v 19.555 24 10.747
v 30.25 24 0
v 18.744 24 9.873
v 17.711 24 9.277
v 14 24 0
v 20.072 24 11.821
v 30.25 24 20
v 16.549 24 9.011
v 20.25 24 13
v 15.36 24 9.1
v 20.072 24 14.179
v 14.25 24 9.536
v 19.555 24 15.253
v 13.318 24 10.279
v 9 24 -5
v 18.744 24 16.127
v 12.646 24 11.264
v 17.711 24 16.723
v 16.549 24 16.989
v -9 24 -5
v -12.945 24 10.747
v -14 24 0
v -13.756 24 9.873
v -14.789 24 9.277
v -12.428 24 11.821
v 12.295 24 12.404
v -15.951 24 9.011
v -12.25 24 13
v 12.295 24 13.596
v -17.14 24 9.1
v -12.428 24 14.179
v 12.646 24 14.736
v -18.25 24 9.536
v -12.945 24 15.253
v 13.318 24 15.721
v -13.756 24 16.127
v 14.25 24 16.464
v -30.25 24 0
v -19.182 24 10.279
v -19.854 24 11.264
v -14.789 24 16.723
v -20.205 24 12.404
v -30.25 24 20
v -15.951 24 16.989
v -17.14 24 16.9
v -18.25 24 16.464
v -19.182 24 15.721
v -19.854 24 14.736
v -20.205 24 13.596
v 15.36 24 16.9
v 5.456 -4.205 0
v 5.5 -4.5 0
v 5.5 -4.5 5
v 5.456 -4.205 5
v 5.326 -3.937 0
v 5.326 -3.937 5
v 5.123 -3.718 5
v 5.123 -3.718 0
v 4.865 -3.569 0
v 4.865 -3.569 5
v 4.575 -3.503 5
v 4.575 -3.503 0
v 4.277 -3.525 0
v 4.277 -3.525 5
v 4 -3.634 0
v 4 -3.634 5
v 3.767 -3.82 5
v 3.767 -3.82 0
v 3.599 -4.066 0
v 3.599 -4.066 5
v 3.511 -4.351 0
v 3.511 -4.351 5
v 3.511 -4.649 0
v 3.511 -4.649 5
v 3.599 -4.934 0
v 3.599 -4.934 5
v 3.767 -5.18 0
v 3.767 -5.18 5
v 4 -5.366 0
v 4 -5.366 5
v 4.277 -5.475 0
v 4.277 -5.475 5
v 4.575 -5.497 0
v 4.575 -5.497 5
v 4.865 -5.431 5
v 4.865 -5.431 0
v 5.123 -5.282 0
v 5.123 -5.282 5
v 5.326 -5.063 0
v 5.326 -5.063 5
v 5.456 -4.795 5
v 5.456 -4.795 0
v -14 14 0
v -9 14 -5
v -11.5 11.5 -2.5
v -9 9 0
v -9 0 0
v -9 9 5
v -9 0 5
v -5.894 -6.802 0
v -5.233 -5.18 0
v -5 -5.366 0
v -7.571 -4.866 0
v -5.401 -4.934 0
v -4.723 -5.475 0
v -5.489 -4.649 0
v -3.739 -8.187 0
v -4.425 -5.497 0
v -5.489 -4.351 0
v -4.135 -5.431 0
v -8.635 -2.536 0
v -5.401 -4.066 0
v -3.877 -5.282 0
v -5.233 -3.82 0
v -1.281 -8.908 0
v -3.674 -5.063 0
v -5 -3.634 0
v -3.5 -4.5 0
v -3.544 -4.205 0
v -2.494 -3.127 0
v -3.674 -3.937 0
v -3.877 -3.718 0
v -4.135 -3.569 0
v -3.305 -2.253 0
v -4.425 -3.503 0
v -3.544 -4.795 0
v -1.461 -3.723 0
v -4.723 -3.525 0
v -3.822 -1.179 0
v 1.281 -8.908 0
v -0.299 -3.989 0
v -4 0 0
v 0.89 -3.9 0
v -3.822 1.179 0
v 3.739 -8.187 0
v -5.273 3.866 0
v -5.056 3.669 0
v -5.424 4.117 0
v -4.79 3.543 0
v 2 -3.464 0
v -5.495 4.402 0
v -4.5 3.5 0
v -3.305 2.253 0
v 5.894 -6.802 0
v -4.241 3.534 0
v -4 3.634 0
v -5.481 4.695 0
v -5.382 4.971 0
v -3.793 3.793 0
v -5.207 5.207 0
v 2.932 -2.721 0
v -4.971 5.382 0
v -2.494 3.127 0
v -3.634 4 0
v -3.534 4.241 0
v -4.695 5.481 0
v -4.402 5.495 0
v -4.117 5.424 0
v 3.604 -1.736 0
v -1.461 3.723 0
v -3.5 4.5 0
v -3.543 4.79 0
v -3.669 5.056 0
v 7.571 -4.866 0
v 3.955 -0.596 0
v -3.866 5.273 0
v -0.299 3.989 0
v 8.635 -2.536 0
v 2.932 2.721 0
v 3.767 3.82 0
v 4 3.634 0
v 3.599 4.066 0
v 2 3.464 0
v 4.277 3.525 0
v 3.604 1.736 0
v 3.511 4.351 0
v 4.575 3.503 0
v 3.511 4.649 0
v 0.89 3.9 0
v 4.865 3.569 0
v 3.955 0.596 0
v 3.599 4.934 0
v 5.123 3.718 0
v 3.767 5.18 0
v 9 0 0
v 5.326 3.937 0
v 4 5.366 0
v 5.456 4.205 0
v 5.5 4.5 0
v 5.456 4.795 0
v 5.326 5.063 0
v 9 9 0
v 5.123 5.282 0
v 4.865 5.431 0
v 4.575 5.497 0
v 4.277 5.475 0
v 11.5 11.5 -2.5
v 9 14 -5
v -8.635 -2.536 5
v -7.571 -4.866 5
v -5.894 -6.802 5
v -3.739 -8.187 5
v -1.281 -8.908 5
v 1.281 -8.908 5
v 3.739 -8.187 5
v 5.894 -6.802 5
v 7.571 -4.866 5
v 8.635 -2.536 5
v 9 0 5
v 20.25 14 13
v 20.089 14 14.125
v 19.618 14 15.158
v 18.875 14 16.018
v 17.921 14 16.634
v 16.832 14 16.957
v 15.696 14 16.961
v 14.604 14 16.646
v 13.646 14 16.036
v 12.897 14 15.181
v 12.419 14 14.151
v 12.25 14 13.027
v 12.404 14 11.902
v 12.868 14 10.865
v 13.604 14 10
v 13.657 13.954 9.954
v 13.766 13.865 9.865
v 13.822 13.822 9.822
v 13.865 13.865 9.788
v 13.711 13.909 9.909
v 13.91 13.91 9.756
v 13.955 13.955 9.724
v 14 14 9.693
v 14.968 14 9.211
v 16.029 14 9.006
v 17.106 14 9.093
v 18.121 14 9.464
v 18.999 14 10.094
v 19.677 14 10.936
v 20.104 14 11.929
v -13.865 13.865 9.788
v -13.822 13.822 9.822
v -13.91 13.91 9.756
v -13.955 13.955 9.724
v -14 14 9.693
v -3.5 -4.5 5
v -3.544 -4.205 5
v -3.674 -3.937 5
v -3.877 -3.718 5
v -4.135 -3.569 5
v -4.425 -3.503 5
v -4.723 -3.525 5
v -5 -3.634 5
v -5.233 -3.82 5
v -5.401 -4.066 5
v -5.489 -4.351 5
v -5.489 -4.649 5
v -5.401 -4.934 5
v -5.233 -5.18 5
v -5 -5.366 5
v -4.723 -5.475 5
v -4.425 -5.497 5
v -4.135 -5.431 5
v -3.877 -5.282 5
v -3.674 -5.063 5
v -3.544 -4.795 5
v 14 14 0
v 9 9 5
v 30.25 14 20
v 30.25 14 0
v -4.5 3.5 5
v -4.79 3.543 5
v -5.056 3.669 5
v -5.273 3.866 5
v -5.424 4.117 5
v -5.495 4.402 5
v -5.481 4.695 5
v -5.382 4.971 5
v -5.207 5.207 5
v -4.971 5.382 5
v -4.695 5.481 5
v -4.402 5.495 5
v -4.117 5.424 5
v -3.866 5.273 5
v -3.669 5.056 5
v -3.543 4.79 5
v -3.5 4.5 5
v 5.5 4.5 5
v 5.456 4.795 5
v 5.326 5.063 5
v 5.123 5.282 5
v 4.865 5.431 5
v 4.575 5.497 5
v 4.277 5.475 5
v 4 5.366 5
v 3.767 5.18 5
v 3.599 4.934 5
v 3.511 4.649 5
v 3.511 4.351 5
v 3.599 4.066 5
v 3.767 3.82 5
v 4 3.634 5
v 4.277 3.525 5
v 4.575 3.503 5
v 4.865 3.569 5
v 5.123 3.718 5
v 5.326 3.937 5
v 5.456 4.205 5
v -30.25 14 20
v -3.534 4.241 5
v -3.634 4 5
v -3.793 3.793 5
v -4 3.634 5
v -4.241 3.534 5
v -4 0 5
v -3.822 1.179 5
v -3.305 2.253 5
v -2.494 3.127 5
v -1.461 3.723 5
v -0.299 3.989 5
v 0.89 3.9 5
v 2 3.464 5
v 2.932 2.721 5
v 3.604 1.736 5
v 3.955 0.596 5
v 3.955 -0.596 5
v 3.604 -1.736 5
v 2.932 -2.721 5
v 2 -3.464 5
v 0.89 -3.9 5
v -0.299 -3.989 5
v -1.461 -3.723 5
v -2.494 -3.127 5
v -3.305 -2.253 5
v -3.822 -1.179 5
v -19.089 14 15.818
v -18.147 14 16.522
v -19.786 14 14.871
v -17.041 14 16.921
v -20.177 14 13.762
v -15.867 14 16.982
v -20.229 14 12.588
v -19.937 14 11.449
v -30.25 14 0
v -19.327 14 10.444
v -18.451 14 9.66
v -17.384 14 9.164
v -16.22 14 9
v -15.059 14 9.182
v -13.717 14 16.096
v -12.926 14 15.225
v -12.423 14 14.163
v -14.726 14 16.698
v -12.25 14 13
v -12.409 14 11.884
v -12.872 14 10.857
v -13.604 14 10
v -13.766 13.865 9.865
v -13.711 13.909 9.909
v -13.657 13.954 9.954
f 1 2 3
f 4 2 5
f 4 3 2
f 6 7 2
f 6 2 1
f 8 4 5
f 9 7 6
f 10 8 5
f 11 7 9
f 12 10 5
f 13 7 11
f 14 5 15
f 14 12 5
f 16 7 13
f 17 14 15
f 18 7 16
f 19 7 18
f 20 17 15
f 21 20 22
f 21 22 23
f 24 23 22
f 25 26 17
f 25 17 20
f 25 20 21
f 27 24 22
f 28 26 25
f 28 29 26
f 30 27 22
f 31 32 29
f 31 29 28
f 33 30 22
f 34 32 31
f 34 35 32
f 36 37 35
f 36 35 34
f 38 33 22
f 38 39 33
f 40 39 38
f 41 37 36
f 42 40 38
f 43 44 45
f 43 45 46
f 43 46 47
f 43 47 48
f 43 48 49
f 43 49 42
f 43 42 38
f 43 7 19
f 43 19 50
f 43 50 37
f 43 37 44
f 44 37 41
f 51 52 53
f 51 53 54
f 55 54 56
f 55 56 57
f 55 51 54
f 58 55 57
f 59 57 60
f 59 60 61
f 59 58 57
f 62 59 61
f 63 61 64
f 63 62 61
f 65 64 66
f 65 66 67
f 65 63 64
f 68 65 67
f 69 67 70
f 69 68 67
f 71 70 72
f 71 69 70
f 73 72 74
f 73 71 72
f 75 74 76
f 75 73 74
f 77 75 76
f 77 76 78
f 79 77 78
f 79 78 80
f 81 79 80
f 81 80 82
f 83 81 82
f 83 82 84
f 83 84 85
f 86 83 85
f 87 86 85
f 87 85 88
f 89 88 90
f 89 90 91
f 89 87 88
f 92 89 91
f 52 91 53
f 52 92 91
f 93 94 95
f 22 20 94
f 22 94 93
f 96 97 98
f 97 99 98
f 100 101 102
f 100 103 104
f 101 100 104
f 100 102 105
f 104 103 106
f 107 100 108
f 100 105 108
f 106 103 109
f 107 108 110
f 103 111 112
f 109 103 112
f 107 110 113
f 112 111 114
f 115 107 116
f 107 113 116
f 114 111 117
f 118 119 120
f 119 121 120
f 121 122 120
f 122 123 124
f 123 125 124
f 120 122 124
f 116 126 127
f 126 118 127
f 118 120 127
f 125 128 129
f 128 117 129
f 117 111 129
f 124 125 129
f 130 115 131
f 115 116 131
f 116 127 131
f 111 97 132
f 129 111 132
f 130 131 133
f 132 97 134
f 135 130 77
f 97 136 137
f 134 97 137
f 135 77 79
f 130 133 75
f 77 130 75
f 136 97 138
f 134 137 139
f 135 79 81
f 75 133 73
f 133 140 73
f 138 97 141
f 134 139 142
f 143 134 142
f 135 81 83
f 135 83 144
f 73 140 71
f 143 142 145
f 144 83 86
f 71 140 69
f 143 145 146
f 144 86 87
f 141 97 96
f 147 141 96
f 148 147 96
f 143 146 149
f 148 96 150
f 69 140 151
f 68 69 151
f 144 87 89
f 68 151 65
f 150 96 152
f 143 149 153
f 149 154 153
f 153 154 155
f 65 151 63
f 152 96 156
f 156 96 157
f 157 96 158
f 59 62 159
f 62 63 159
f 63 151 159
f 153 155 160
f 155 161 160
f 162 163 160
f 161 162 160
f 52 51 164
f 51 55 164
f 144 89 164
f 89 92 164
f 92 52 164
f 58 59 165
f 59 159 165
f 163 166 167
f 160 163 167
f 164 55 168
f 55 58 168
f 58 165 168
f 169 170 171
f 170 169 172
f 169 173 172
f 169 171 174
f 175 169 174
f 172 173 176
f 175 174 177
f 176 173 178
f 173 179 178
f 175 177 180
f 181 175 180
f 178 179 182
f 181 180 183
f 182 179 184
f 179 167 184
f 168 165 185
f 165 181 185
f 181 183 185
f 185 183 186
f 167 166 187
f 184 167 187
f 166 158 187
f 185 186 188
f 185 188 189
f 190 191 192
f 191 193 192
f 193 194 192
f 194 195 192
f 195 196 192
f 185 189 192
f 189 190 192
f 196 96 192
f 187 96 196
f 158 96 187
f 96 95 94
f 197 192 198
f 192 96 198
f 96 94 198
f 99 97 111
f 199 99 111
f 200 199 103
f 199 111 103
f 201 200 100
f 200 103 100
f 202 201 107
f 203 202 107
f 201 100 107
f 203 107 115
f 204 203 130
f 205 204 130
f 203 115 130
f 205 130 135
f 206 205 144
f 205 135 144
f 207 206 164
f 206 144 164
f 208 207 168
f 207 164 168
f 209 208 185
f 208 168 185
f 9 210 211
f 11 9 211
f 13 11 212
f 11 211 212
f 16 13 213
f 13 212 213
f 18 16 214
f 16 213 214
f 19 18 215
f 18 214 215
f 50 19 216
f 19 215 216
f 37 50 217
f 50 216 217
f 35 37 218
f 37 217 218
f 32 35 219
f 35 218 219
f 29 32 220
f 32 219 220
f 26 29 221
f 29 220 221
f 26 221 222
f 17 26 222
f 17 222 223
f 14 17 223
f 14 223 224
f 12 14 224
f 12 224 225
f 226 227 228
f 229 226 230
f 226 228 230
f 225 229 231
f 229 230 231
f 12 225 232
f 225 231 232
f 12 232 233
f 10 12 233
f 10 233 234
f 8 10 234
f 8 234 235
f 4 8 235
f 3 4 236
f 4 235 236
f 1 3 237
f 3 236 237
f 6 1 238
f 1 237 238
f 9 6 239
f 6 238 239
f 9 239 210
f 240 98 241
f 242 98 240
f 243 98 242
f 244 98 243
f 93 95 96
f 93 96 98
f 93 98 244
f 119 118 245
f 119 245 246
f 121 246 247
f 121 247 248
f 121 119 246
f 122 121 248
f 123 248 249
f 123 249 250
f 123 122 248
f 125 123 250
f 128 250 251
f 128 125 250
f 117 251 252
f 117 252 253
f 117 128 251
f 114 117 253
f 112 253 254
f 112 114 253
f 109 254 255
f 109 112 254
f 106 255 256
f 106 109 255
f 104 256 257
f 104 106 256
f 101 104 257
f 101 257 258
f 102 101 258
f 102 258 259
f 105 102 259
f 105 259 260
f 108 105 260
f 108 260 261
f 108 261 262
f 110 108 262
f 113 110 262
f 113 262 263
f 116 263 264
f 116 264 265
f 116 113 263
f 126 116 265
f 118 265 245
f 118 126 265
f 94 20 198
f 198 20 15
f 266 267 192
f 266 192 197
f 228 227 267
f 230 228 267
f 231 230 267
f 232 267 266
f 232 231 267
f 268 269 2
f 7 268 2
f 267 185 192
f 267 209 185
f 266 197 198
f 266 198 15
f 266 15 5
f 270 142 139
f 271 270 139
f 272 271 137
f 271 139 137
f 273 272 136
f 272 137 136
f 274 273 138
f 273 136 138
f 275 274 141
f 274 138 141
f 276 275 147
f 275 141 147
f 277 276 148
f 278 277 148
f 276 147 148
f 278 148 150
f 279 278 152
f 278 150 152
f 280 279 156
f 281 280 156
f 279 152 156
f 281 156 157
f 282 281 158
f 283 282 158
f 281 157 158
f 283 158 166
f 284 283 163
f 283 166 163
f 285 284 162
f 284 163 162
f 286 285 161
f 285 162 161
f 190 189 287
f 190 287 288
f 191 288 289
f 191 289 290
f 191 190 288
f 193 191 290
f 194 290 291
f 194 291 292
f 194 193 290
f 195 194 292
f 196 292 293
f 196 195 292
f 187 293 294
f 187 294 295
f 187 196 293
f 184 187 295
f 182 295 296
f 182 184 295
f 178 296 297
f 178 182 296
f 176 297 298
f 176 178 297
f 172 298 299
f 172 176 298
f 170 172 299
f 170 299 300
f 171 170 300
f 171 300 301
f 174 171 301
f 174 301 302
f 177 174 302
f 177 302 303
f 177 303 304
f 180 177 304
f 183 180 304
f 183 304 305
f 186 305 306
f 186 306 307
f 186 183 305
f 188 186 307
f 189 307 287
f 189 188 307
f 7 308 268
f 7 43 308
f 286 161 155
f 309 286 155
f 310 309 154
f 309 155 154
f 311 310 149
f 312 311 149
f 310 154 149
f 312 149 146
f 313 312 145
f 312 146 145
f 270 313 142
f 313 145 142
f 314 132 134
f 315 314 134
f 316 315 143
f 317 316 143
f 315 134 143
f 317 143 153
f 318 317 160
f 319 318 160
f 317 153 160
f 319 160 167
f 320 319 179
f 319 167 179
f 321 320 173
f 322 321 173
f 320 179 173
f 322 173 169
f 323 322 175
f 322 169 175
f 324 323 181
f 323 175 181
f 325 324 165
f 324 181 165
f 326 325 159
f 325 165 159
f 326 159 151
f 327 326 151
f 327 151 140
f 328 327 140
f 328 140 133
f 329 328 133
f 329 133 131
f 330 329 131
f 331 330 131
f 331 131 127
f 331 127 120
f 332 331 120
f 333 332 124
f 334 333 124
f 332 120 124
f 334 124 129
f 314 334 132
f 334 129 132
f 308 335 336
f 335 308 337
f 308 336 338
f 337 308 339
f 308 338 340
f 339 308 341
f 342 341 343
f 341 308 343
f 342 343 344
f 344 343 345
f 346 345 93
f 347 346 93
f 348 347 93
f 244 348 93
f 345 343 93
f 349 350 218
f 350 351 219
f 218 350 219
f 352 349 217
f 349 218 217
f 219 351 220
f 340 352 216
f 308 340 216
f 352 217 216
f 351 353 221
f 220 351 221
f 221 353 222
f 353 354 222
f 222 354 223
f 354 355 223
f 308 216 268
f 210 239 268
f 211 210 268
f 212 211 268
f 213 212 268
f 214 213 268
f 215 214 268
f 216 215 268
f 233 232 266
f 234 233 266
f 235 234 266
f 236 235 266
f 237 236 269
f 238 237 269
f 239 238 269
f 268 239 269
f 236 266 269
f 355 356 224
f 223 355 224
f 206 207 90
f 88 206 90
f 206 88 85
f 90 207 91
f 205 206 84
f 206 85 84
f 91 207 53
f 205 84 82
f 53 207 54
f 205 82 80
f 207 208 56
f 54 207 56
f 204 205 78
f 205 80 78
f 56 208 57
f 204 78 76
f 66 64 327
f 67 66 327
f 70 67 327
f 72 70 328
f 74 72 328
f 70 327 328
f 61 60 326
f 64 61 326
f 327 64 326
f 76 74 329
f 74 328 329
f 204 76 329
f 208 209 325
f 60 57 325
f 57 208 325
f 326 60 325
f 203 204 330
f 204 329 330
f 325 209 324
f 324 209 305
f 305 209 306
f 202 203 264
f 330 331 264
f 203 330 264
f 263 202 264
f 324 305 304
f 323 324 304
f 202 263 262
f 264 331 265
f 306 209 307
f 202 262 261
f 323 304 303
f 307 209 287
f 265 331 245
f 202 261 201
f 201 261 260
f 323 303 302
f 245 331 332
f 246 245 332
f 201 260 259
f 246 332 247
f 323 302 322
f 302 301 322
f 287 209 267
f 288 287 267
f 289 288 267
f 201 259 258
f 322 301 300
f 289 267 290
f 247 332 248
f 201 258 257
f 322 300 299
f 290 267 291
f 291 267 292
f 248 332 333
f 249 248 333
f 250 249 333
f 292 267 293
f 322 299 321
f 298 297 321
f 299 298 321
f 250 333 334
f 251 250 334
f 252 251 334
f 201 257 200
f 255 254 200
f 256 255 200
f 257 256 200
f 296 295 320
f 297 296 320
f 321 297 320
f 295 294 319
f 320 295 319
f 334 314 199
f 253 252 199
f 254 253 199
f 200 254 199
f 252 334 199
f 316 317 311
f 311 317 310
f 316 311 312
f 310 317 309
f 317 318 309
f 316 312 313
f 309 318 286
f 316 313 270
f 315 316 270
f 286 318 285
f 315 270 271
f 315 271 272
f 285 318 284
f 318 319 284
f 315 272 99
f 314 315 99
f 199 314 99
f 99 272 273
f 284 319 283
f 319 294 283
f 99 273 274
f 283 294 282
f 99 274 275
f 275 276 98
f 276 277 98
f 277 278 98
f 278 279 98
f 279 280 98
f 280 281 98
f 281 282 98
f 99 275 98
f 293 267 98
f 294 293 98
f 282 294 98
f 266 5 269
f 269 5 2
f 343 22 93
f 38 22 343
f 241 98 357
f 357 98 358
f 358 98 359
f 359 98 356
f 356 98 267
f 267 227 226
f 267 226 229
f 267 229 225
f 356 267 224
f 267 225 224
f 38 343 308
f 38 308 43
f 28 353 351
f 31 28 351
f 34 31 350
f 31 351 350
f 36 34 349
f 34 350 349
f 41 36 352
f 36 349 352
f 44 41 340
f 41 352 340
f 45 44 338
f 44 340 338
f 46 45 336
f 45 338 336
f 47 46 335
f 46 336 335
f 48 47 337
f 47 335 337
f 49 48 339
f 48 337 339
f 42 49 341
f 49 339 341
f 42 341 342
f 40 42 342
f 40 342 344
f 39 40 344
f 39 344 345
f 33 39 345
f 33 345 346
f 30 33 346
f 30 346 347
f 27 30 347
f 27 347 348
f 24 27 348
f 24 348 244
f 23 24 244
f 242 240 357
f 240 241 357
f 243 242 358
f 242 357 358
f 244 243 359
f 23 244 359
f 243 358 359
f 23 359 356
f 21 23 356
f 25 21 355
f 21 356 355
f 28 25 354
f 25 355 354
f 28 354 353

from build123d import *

# Parameters (mm, degrees)
F0_R         = 1
F0_W         = 18
F0_H         = 10
F1_DEPTH     = 5
F0_W_2       = 21.25
F0_R_2       = 4
F2_DEPTH     = 20
F3_R         = 4
F4_DEPTH     = 25
F5_DEPTH     = 5
F6_T4_DEPTH  = 18
F7_T1_DEPTH  = 5
F7_T3_DEPTH  = 18
F7_T8_DEPTH  = 10
F7_T13_DEPTH = 10
F7_T19_DEPTH = 22.8584149398
F7_T24_DEPTH = 17.8584149398
F7_T33_DEPTH = 30.8584149398
F7_S35_R     = 4
F7_T36_DEPTH = 17
F7_T39_DEPTH = 17.8584149398
F7_S41_R     = 4
F7_T42_DEPTH = 11
F7_T48_DEPTH = 30.8584149398
F7_S50_R     = 4
F7_T51_DEPTH = 17
F7_T54_DEPTH = 17.8584149398
F7_S56_R     = 4
F7_T57_DEPTH = 11
F7_T63_DEPTH = 17.8584149398
F7_T69_DEPTH = 22.8584149398


# Not quite as in the source:
# - a fillet or chamfer that OpenCascade refuses, or shapes differently, is made with other operations: its cross-section is extruded or revolved along the edge and cut away or added
# - a feature names something its author has since deleted; it is built from what else it names


with BuildPart() as f1:
    # F0 (on Top) → F1 (new body)
    with BuildSketch(Plane.XY):
        with BuildLine():
            Line((9, 0), (4, 0))
            ThreePointArc((4, 0), (0, -4), (-4, 0))
            Line((-4, 0), (-9, 0))
            ThreePointArc((-9, 0), (0, -9), (9, 0))
        make_face()
        with Locations((-4.5, -4.5)):
            Circle(F0_R, mode=Mode.SUBTRACT)
        with Locations((4.5, -4.5)):
            Circle(F0_R, mode=Mode.SUBTRACT)
        with BuildLine():
            ThreePointArc((-4, 0), (0, 4), (4, 0))
            Line((4, 0), (9, 0))
            ThreePointArc((9, 0), (0, 9), (-9, 0))
            Line((-9, 0), (-4, 0))
        make_face()
        with BuildLine():
            ThreePointArc((-4.5, 3.5), (-5.2071067812, 5.2071067812), (-3.5, 4.5))
            ThreePointArc((-3.5, 4.5), (-3.7928932188, 3.7928932188), (-4.5, 3.5))
        make_face(mode=Mode.SUBTRACT)
        with Locations((4.5, 4.5)):
            Circle(F0_R, mode=Mode.SUBTRACT)
        with BuildLine():
            ThreePointArc((-9, 0), (0, 9), (9, 0))
            Line((9, 0), (9, 14))
            Line((9, 14), (-9, 14))
            Line((-9, 14), (-9, 0))
        make_face()
        with Locations((0, 19)):
            Rectangle(F0_W, F0_H)
    extrude(amount=F1_DEPTH)

    # F0 (on Top) → F2 (join)
    with BuildSketch(Plane.XY):
        with Locations((0, 19)):
            Rectangle(F0_W, F0_H)
        with Locations((-19.625, 19)):
            Rectangle(F0_W_2, F0_H)
        with Locations((-20.25, 19)):
            Circle(F0_R_2, mode=Mode.SUBTRACT)
        with Locations((19.625, 19)):
            Rectangle(F0_W_2, F0_H)
        with Locations((20.25, 19)):
            Circle(F0_R_2, mode=Mode.SUBTRACT)
        with Locations((20.25, 19)):
            Circle(F0_R_2)
        with Locations((-20.25, 19)):
            Circle(F0_R_2)
    extrude(amount=F2_DEPTH)

    # F3 (on Front) → F4 (cut)
    with BuildSketch(Plane.XZ):
        with Locations((-16.25, 13)):
            Circle(F3_R)
        with Locations((16.25, 13)):
            Circle(F3_R)
    extrude(amount=-F4_DEPTH, mode=Mode.SUBTRACT)

    # F0 (on Top) → F5 (join)
    with BuildSketch(Plane.XY):
        with Locations((0, 19)):
            Rectangle(F0_W, F0_H)
    extrude(amount=-F5_DEPTH)

    # F6: chamfer of 5 on 1 edges, made by hand


with BuildPart() as f6_tool2:
    # F6_s3 → F6_t4 (new body)
    with BuildSketch(Plane.YZ.offset(-9)):
        Polygon((9, 0), (14, -5), (14, 0), align=None)
    extrude(amount=F6_T4_DEPTH)

    split(bisect_by=Plane.XY.offset(-5), keep=Keep.TOP)


with BuildPart() as f1_1:
    add(f1.part)

    # F6_t1: union F6_tool2
    add(f6_tool2.part)

    # F7: chamfer of 5 on 5 edges, made by hand

    # F7_s2 → F7_t1 (join)
    with BuildSketch(Plane.XY):
        Polygon((-9, 9), (-14, 14), (-9, 14), align=None)
        Polygon((9, 9), (14, 14), (9, 14), align=None)
    extrude(amount=F7_T1_DEPTH)

    # F7_s4 → F7_t3 (join)
    with BuildSketch(Plane.YZ.offset(-9)):
        Polygon((9, 5), (14, 10), (14, 5), align=None)
    extrude(amount=F7_T3_DEPTH)


with BuildPart() as f7_tool6:
    # F7_s7 → F7_t8 (new body)
    with BuildSketch(Plane.XZ.offset(-14)):
        Polygon((9, -5), (14, 0), (9, 0), align=None)
    extrude(amount=-F7_T8_DEPTH)

    split(bisect_by=Plane.XY.offset(-5), keep=Keep.TOP)


with BuildPart() as f1_2:
    add(f1_1.part)

    # F7_t5: union F7_tool6
    add(f7_tool6.part)


with BuildPart() as f7_tool11:
    # F7_s12 → F7_t13 (new body)
    with BuildSketch(Plane.XZ.offset(-24)):
        Polygon((-9, -5), (-14, 0), (-9, 0), align=None)
    extrude(amount=F7_T13_DEPTH)

    split(bisect_by=Plane.XY.offset(-5), keep=Keep.TOP)


with BuildPart() as f1_3:
    add(f1_2.part)

    # F7_t10: union F7_tool11
    add(f7_tool11.part)


with BuildPart() as f7_tool17:
    # F7_s18 → F7_t19 (new body)
    with BuildSketch(Plane.XZ.offset(-24)):
        Polygon((-9, -5), (-14, 0), (-9, 0), align=None)
    extrude(amount=F7_T19_DEPTH)

    split(bisect_by=Plane(origin=(0, 4.5, 4.5), x_dir=(1, 0, 0), z_dir=(0, 0.7071067812, 0.7071067812)), keep=Keep.TOP)

    split(bisect_by=Plane.XZ.offset(-14), keep=Keep.TOP)


with BuildPart() as f7_tool22:
    # F7_s23 → F7_t24 (new body)
    with BuildSketch(Plane.XY.offset(-12.8584149398)):
        Polygon((-9, 9), (-14, 14), (-9, 14), align=None)
    extrude(amount=F7_T24_DEPTH)

    split(bisect_by=Plane.XY, keep=Keep.BOTTOM)

    split(bisect_by=Plane(origin=(0, 4.5, 4.5), x_dir=(1, 0, 0), z_dir=(0, 0.7071067812, 0.7071067812)), keep=Keep.TOP)

    split(bisect_by=Plane.XY.offset(-5), keep=Keep.TOP)


with BuildPart() as f7_tool17_1:
    add(f7_tool17.part)

    # F7_t28: intersect F7_tool22
    add(f7_tool22.part, mode=Mode.INTERSECT)


with BuildPart() as f1_4:
    add(f1_3.part)

    # F7_t15: union F7_tool17
    add(f7_tool17_1.part)


with BuildPart() as f7_tool31:
    # F7_s32 → F7_t33 (new body)
    with BuildSketch(Plane.YZ.offset(9)):
        Polygon((9, 5), (14, 10), (14, 5), align=None)
    extrude(amount=-F7_T33_DEPTH)

    split(bisect_by=Plane.YZ.offset(-9), keep=Keep.BOTTOM)

    # F7_s35 → F7_t36 (cut, symmetric)
    with BuildSketch(Plane.XZ.offset(-11.5)):
        with Locations((-16.25, 13)):
            Circle(F7_S35_R)
    extrude(amount=F7_T36_DEPTH, both=True, mode=Mode.SUBTRACT)


with BuildPart() as f7_tool37:
    # F7_s38 → F7_t39 (new body)
    with BuildSketch(Plane.XY):
        Polygon((-9, 9), (-14, 14), (-9, 14), align=None)
    extrude(amount=F7_T39_DEPTH)

    split(bisect_by=Plane.XY.offset(5), keep=Keep.TOP)

    # F7_s41 → F7_t42 (cut, symmetric)
    with BuildSketch(Plane.XZ.offset(-11.5)):
        with Locations((-16.25, 13)):
            Circle(F7_S41_R)
    extrude(amount=F7_T42_DEPTH, both=True, mode=Mode.SUBTRACT)


with BuildPart() as f7_tool31_1:
    add(f7_tool31.part)

    # F7_t43: intersect F7_tool37
    add(f7_tool37.part, mode=Mode.INTERSECT)


with BuildPart() as f1_5:
    add(f1_4.part)

    # F7_t29: union F7_tool31
    add(f7_tool31_1.part)


with BuildPart() as f7_tool46:
    # F7_s47 → F7_t48 (new body)
    with BuildSketch(Plane.YZ.offset(21.8584149398)):
        Polygon((9, 5), (14, 10), (14, 5), align=None)
    extrude(amount=-F7_T48_DEPTH)

    split(bisect_by=Plane.YZ.offset(9), keep=Keep.TOP)

    # F7_s50 → F7_t51 (cut, symmetric)
    with BuildSketch(Plane.XZ.offset(-11.5)):
        with Locations((16.25, 13)):
            Circle(F7_S50_R)
    extrude(amount=F7_T51_DEPTH, both=True, mode=Mode.SUBTRACT)


with BuildPart() as f7_tool52:
    # F7_s53 → F7_t54 (new body)
    with BuildSketch(Plane.XY.offset(17.8584149398)):
        Polygon((9, 9), (14, 14), (9, 14), align=None)
    extrude(amount=-F7_T54_DEPTH)

    split(bisect_by=Plane.XY.offset(5), keep=Keep.TOP)

    # F7_s56 → F7_t57 (cut, symmetric)
    with BuildSketch(Plane.XZ.offset(-11.5)):
        with Locations((16.25, 13)):
            Circle(F7_S56_R)
    extrude(amount=F7_T57_DEPTH, both=True, mode=Mode.SUBTRACT)


with BuildPart() as f7_tool46_1:
    add(f7_tool46.part)

    # F7_t58: intersect F7_tool52
    add(f7_tool52.part, mode=Mode.INTERSECT)


with BuildPart() as f1_6:
    add(f1_5.part)

    # F7_t44: union F7_tool46
    add(f7_tool46_1.part)


with BuildPart() as f7_tool61:
    # F7_s62 → F7_t63 (new body)
    with BuildSketch(Plane.XY.offset(5)):
        Polygon((9, 9), (14, 14), (9, 14), align=None)
    extrude(amount=-F7_T63_DEPTH)

    split(bisect_by=Plane.XY, keep=Keep.BOTTOM)

    split(bisect_by=Plane(origin=(0, 4.5, 4.5), x_dir=(1, 0, 0), z_dir=(0, 0.7071067812, 0.7071067812)), keep=Keep.TOP)

    split(bisect_by=Plane.XY.offset(-5), keep=Keep.TOP)


with BuildPart() as f7_tool67:
    # F7_s68 → F7_t69 (new body)
    with BuildSketch(Plane.XZ.offset(-1.1415850602)):
        Polygon((9, -5), (14, 0), (9, 0), align=None)
    extrude(amount=-F7_T69_DEPTH)

    split(bisect_by=Plane(origin=(0, 4.5, 4.5), x_dir=(1, 0, 0), z_dir=(0, 0.7071067812, 0.7071067812)), keep=Keep.TOP)

    split(bisect_by=Plane.XZ.offset(-14), keep=Keep.TOP)


with BuildPart() as f7_tool61_1:
    add(f7_tool61.part)

    # F7_t72: intersect F7_tool67
    add(f7_tool67.part, mode=Mode.INTERSECT)


with BuildPart() as f1_7:
    add(f1_6.part)

    # F7_t59: union F7_tool61
    add(f7_tool61_1.part)


solid = f1_7.part
